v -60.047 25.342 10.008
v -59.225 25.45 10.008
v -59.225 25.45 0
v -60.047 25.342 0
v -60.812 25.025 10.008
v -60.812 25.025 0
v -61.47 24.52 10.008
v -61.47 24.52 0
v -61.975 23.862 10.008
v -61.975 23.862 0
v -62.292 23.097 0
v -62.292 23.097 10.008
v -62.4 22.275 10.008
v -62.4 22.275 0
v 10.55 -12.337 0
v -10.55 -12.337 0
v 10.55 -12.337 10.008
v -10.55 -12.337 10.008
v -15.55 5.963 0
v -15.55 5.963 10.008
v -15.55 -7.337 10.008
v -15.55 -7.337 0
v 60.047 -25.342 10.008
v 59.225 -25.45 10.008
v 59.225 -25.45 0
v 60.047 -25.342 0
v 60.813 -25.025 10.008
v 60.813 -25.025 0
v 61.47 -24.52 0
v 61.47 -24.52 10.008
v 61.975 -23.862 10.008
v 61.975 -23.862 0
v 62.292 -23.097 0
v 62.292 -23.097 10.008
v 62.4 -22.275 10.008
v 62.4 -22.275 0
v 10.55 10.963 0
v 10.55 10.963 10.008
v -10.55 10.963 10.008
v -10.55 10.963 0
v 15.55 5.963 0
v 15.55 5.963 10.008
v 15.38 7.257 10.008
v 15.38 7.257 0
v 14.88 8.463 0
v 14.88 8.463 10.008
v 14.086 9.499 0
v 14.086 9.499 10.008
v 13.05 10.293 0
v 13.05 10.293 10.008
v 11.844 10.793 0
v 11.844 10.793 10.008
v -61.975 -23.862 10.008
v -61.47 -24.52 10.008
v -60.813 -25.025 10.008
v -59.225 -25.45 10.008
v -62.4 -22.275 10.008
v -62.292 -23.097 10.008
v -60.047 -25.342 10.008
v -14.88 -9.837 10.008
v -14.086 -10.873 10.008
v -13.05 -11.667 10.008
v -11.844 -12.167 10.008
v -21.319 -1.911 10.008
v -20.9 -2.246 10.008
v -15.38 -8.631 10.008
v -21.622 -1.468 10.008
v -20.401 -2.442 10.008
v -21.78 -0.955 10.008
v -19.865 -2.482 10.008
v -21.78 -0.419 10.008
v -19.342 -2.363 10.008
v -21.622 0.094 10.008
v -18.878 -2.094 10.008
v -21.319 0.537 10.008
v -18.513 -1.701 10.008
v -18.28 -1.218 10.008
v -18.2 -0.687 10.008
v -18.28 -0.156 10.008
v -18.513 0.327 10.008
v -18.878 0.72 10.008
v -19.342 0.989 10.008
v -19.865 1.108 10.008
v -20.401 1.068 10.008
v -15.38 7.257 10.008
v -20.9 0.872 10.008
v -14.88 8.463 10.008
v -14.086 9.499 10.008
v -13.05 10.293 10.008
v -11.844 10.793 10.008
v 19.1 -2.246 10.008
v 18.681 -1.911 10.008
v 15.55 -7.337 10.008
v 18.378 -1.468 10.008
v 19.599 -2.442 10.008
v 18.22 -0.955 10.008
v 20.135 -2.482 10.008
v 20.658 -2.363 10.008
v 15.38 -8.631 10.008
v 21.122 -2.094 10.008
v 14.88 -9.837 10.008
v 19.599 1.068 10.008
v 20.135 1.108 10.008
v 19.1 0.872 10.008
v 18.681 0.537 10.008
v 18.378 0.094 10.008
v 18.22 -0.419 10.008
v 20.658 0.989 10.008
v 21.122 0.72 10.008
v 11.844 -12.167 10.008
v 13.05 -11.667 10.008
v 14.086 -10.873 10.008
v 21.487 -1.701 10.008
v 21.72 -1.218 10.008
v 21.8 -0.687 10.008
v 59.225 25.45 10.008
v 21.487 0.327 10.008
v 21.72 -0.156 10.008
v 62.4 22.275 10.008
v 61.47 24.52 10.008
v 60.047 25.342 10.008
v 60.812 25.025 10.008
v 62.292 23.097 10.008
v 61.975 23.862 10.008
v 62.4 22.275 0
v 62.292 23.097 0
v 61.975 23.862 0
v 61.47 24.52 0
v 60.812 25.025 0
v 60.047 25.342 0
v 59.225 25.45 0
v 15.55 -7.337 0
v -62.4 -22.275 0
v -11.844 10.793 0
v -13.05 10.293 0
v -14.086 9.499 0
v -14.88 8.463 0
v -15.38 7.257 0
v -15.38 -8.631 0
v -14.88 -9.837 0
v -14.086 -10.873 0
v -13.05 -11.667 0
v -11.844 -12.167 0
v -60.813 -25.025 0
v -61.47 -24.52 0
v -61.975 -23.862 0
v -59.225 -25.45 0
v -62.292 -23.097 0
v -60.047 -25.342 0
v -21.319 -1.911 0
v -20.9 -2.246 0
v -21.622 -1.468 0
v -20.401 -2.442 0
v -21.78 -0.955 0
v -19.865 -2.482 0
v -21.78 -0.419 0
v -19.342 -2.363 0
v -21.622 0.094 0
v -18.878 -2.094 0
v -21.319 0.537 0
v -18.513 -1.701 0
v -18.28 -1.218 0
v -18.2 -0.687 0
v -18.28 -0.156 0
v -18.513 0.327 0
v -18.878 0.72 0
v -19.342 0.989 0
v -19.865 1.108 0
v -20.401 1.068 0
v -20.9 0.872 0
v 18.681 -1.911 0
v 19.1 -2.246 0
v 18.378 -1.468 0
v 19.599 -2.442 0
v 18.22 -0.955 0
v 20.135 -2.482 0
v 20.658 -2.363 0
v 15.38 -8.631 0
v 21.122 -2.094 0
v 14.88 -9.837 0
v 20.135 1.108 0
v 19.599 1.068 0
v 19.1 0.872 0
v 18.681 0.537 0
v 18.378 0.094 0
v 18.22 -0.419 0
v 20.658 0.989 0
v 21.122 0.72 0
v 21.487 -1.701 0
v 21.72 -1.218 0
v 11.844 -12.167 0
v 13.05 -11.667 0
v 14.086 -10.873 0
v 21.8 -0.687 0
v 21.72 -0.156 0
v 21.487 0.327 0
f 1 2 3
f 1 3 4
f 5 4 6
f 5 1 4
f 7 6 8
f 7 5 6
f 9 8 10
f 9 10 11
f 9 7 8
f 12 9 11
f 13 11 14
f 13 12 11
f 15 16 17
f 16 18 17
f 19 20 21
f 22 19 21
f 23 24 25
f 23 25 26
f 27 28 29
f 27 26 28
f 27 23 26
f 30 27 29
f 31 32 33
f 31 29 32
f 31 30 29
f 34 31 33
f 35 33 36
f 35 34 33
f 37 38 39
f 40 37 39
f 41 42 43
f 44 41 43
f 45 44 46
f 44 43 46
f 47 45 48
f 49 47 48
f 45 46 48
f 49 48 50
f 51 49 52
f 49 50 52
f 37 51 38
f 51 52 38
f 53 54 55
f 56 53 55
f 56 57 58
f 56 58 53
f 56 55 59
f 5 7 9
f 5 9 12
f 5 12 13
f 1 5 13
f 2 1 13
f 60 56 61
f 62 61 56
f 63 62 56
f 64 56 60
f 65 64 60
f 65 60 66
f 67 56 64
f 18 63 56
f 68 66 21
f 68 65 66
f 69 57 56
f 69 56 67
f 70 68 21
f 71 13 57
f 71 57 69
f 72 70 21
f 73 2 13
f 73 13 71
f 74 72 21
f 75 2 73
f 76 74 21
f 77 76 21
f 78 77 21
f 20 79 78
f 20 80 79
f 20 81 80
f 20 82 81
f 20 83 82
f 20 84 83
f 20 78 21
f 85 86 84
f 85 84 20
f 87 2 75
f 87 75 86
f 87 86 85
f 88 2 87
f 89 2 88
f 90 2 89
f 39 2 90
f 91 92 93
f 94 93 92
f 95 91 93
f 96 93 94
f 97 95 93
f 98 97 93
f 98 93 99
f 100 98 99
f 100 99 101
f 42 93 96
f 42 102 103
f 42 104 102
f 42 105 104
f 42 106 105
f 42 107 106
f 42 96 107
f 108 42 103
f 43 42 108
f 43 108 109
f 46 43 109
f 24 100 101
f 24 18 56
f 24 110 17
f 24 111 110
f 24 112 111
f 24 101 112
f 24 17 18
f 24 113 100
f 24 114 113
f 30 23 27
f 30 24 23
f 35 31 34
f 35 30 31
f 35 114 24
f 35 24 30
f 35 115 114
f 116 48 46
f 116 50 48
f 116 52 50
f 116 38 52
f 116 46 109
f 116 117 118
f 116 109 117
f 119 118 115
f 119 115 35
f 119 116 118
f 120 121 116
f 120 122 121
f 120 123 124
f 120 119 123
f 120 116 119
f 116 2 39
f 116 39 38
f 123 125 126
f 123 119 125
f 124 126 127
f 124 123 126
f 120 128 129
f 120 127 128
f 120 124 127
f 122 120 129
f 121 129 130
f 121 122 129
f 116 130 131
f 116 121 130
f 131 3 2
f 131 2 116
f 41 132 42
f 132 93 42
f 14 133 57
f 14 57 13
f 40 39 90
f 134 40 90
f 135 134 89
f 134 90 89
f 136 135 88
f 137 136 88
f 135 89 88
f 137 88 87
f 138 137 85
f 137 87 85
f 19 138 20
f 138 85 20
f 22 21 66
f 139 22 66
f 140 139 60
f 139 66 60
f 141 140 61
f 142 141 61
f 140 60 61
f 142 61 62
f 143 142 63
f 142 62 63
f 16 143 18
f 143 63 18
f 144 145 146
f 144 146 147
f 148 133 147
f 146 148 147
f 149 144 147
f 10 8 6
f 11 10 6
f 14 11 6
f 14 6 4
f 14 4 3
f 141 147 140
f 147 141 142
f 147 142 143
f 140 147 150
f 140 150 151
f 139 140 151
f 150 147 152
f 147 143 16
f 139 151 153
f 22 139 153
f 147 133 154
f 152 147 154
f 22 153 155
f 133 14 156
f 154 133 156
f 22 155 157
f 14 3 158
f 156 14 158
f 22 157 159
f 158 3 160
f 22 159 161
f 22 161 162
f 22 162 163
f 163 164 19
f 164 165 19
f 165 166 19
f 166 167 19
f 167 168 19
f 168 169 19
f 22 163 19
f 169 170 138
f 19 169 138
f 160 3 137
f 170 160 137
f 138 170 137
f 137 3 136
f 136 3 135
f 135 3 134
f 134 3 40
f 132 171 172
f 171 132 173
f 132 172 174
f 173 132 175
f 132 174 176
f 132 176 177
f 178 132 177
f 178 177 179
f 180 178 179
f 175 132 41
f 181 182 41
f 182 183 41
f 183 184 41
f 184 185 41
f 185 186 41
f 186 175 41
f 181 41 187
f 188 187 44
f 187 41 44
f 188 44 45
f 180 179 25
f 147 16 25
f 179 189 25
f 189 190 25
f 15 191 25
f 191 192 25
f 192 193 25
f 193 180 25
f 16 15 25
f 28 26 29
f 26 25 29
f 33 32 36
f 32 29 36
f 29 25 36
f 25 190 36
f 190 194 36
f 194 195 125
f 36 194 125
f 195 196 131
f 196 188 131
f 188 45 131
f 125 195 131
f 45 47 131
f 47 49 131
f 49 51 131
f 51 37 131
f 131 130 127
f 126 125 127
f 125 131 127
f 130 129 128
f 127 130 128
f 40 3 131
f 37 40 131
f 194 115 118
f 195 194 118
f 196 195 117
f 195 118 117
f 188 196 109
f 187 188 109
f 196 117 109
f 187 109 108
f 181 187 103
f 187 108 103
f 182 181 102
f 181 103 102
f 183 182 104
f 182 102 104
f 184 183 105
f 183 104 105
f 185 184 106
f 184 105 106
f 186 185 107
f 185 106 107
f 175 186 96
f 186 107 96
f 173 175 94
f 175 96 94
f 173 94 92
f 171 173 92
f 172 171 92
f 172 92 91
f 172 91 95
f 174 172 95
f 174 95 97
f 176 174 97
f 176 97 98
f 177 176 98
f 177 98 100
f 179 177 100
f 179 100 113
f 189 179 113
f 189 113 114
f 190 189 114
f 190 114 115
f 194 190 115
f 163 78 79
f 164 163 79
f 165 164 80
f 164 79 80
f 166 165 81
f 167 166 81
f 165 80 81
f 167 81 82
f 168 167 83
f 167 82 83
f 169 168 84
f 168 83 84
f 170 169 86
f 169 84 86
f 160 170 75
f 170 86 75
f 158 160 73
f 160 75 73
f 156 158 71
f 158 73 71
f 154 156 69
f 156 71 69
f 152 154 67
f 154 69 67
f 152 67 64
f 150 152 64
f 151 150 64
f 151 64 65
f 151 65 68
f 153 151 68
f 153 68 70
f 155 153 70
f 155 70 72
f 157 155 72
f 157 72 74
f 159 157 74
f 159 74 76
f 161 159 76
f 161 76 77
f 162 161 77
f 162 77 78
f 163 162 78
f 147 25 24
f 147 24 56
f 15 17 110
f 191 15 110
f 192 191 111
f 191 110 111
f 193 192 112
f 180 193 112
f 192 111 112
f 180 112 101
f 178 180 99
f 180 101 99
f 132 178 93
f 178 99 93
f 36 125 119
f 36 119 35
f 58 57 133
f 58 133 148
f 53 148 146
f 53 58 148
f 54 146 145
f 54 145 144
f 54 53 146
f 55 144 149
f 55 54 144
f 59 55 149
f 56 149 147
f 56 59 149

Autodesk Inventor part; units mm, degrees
ref_plane "YZ Plane" through (0, 0, 0) normal (1, 0, 0) x (0, 1, 0)
ref_plane "XZ Plane" through (0, 0, 0) normal (0, 1, 0) x (-1, 0, 0)
ref_plane "XY Plane" through (0, 0, 0) normal (0, 0, 1) x (1, 0, 0)
sketch "Sketch1" plane through (0, 0, 0) normal (0, 0, 1) x (1, 0, 0)
  line L0 (-62.4, 25.45) -> (62.4, 25.45)
  line L1 (62.4, 25.45) -> (62.4, -25.45)
  line L2 (62.4, -25.45) -> (-62.4, -25.45)
  line L3 (-62.4, -25.45) -> (-62.4, 25.45)
  point P0 (0, 0)
  dimension "d0" = 124.8
  dimension "d1" = 50.9
  dimension "d2" = 62.4
  dimension "d3" = 25.45
extrude "Extrusion1" add sketch "Sketch1" along normal blind 10.0076
fillet "Fillet1" radius 3.175 1 edges at (-62.4, 25.45, 5.0038)
fillet "Fillet2" radius 3.175 3 edges at (62.4, 25.45, 5.0038) (62.4, -25.45, 5.0038) (-62.4, -25.45, 5.0038)
sketch "Sketch6" plane through (0, 0, 10.0076) normal (0, 0, 1) x (1, 0, 0)
  arc A0 (10.55, -12.337) -> (15.55, -7.337) centre (10.55, -7.337) ccw projected
  line L0 (15.55, -7.337) -> (15.55, 5.963) projected
  arc A1 (15.55, 5.963) -> (10.55, 10.963) centre (10.55, 5.963) ccw projected
  line L1 (10.55, 10.963) -> (-10.55, 10.963) projected
  arc A2 (-10.55, 10.963) -> (-15.55, 5.963) centre (-10.55, 5.963) ccw projected
  line L2 (-15.55, 5.963) -> (-15.55, -7.337) projected
  arc A3 (-15.55, -7.337) -> (-10.55, -12.337) centre (-10.55, -7.337) ccw projected
  line L3 (-10.55, -12.337) -> (10.55, -12.337) projected
  circle A4 centre (-20, -0.687) radius 1.8 projected
  circle A5 centre (20, -0.687) radius 1.8 projected
  point P0 (0, 0)
extrude "Extrusion7" cut sketch "Sketch6" against normal up to surface (10.0076 mm away)
equation "\"d2\" = 0.5 * d0"
equation "\"d3\" = 0.5 * d1"
properties part number "front cover"
